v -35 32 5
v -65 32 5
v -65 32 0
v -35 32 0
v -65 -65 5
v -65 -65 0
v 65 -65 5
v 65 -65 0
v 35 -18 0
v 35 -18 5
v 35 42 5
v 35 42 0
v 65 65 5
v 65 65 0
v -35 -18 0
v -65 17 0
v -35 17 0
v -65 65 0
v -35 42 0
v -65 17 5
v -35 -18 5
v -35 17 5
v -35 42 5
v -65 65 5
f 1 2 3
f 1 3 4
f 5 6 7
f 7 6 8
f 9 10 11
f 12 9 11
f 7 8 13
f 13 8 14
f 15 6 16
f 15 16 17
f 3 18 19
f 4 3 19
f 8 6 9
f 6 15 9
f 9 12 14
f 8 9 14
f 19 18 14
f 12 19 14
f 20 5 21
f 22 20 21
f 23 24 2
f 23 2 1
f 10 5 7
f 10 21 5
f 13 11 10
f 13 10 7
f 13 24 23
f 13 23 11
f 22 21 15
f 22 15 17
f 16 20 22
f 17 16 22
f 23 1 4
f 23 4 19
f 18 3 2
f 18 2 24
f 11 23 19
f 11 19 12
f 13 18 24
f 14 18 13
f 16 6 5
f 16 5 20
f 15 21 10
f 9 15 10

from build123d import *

# Parameters (mm, degrees)
SCHIZZO1_W                   = 130
SCHIZZO1_H                   = 130
ESTRUSIONE_ESTRUSIONE1_DEPTH = 5
SCHIZZO2_W                   = 70
SCHIZZO2_H                   = 60
TAGLIO_ESTRUSIONE1_DEPTH     = 5
SCHIZZO3_W                   = 30
SCHIZZO3_H                   = 15
TAGLIO_ESTRUSIONE2_DEPTH     = 10


with BuildPart() as part:
    # Schizzo1 → Estrusione-Estrusione1 (new body)
    with BuildSketch(Plane.XY):
        Rectangle(SCHIZZO1_W, SCHIZZO1_H)
    extrude(amount=ESTRUSIONE_ESTRUSIONE1_DEPTH)

    # Schizzo2 → Taglio-Estrusione1 (cut)
    with BuildSketch(Plane.XY.offset(5)):
        with Locations((0, 12)):
            Rectangle(SCHIZZO2_W, SCHIZZO2_H)
    extrude(amount=-TAGLIO_ESTRUSIONE1_DEPTH, mode=Mode.SUBTRACT)

    # Schizzo3 → Taglio-Estrusione2 (cut)
    with BuildSketch(Plane.XY.offset(5)):
        with Locations((-50, 24.5)):
            Rectangle(SCHIZZO3_W, SCHIZZO3_H)
    extrude(amount=-TAGLIO_ESTRUSIONE2_DEPTH, mode=Mode.SUBTRACT)


solid = part.part
